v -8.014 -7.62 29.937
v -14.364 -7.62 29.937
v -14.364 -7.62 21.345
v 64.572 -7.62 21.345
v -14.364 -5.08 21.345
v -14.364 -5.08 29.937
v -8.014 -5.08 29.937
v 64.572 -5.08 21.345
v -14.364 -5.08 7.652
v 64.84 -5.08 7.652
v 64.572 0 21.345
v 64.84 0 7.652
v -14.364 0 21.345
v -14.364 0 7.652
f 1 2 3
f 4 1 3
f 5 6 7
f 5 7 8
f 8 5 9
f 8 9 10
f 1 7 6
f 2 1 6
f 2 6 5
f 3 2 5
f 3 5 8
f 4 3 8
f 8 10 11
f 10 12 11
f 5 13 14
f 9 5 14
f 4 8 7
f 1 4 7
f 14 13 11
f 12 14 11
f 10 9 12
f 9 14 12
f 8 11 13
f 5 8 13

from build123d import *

# Parameters (mm, degrees)
F1_DEPTH = 2.54
F3_DEPTH = 2.54
F5_DEPTH = 2.54


with BuildPart() as f1:
    # F0 (on Front) → F1 (new body)
    with BuildSketch(Plane.XZ):
        Polygon((-14.3642118201, 21.3449504226), (-14.3642118201, 7.6519632712), (64.8403167725, 7.6519632712), (64.5718276501, 21.3449504226), align=None)
    extrude(amount=F1_DEPTH)

    # F3 (add): a face of the model
    f3_faces = [f1.faces().sort_by_distance(p)[0] for p in [
        (25.1709681821, -2.54, 14.4945822159),
    ]]
    extrude(f3_faces, amount=F3_DEPTH)


with BuildPart() as f5:
    # F4 (on face) → F5 (new body)
    with BuildSketch(Plane.XZ.offset(5.08)):
        Polygon((-14.3642118201, 29.9366265535), (-14.3642118201, 21.3449504226), (64.5718276501, 21.3449504226), (-8.0142118201, 29.9366265535), align=None)
    extrude(amount=F5_DEPTH)


solid = Compound([f1.part, f5.part])
